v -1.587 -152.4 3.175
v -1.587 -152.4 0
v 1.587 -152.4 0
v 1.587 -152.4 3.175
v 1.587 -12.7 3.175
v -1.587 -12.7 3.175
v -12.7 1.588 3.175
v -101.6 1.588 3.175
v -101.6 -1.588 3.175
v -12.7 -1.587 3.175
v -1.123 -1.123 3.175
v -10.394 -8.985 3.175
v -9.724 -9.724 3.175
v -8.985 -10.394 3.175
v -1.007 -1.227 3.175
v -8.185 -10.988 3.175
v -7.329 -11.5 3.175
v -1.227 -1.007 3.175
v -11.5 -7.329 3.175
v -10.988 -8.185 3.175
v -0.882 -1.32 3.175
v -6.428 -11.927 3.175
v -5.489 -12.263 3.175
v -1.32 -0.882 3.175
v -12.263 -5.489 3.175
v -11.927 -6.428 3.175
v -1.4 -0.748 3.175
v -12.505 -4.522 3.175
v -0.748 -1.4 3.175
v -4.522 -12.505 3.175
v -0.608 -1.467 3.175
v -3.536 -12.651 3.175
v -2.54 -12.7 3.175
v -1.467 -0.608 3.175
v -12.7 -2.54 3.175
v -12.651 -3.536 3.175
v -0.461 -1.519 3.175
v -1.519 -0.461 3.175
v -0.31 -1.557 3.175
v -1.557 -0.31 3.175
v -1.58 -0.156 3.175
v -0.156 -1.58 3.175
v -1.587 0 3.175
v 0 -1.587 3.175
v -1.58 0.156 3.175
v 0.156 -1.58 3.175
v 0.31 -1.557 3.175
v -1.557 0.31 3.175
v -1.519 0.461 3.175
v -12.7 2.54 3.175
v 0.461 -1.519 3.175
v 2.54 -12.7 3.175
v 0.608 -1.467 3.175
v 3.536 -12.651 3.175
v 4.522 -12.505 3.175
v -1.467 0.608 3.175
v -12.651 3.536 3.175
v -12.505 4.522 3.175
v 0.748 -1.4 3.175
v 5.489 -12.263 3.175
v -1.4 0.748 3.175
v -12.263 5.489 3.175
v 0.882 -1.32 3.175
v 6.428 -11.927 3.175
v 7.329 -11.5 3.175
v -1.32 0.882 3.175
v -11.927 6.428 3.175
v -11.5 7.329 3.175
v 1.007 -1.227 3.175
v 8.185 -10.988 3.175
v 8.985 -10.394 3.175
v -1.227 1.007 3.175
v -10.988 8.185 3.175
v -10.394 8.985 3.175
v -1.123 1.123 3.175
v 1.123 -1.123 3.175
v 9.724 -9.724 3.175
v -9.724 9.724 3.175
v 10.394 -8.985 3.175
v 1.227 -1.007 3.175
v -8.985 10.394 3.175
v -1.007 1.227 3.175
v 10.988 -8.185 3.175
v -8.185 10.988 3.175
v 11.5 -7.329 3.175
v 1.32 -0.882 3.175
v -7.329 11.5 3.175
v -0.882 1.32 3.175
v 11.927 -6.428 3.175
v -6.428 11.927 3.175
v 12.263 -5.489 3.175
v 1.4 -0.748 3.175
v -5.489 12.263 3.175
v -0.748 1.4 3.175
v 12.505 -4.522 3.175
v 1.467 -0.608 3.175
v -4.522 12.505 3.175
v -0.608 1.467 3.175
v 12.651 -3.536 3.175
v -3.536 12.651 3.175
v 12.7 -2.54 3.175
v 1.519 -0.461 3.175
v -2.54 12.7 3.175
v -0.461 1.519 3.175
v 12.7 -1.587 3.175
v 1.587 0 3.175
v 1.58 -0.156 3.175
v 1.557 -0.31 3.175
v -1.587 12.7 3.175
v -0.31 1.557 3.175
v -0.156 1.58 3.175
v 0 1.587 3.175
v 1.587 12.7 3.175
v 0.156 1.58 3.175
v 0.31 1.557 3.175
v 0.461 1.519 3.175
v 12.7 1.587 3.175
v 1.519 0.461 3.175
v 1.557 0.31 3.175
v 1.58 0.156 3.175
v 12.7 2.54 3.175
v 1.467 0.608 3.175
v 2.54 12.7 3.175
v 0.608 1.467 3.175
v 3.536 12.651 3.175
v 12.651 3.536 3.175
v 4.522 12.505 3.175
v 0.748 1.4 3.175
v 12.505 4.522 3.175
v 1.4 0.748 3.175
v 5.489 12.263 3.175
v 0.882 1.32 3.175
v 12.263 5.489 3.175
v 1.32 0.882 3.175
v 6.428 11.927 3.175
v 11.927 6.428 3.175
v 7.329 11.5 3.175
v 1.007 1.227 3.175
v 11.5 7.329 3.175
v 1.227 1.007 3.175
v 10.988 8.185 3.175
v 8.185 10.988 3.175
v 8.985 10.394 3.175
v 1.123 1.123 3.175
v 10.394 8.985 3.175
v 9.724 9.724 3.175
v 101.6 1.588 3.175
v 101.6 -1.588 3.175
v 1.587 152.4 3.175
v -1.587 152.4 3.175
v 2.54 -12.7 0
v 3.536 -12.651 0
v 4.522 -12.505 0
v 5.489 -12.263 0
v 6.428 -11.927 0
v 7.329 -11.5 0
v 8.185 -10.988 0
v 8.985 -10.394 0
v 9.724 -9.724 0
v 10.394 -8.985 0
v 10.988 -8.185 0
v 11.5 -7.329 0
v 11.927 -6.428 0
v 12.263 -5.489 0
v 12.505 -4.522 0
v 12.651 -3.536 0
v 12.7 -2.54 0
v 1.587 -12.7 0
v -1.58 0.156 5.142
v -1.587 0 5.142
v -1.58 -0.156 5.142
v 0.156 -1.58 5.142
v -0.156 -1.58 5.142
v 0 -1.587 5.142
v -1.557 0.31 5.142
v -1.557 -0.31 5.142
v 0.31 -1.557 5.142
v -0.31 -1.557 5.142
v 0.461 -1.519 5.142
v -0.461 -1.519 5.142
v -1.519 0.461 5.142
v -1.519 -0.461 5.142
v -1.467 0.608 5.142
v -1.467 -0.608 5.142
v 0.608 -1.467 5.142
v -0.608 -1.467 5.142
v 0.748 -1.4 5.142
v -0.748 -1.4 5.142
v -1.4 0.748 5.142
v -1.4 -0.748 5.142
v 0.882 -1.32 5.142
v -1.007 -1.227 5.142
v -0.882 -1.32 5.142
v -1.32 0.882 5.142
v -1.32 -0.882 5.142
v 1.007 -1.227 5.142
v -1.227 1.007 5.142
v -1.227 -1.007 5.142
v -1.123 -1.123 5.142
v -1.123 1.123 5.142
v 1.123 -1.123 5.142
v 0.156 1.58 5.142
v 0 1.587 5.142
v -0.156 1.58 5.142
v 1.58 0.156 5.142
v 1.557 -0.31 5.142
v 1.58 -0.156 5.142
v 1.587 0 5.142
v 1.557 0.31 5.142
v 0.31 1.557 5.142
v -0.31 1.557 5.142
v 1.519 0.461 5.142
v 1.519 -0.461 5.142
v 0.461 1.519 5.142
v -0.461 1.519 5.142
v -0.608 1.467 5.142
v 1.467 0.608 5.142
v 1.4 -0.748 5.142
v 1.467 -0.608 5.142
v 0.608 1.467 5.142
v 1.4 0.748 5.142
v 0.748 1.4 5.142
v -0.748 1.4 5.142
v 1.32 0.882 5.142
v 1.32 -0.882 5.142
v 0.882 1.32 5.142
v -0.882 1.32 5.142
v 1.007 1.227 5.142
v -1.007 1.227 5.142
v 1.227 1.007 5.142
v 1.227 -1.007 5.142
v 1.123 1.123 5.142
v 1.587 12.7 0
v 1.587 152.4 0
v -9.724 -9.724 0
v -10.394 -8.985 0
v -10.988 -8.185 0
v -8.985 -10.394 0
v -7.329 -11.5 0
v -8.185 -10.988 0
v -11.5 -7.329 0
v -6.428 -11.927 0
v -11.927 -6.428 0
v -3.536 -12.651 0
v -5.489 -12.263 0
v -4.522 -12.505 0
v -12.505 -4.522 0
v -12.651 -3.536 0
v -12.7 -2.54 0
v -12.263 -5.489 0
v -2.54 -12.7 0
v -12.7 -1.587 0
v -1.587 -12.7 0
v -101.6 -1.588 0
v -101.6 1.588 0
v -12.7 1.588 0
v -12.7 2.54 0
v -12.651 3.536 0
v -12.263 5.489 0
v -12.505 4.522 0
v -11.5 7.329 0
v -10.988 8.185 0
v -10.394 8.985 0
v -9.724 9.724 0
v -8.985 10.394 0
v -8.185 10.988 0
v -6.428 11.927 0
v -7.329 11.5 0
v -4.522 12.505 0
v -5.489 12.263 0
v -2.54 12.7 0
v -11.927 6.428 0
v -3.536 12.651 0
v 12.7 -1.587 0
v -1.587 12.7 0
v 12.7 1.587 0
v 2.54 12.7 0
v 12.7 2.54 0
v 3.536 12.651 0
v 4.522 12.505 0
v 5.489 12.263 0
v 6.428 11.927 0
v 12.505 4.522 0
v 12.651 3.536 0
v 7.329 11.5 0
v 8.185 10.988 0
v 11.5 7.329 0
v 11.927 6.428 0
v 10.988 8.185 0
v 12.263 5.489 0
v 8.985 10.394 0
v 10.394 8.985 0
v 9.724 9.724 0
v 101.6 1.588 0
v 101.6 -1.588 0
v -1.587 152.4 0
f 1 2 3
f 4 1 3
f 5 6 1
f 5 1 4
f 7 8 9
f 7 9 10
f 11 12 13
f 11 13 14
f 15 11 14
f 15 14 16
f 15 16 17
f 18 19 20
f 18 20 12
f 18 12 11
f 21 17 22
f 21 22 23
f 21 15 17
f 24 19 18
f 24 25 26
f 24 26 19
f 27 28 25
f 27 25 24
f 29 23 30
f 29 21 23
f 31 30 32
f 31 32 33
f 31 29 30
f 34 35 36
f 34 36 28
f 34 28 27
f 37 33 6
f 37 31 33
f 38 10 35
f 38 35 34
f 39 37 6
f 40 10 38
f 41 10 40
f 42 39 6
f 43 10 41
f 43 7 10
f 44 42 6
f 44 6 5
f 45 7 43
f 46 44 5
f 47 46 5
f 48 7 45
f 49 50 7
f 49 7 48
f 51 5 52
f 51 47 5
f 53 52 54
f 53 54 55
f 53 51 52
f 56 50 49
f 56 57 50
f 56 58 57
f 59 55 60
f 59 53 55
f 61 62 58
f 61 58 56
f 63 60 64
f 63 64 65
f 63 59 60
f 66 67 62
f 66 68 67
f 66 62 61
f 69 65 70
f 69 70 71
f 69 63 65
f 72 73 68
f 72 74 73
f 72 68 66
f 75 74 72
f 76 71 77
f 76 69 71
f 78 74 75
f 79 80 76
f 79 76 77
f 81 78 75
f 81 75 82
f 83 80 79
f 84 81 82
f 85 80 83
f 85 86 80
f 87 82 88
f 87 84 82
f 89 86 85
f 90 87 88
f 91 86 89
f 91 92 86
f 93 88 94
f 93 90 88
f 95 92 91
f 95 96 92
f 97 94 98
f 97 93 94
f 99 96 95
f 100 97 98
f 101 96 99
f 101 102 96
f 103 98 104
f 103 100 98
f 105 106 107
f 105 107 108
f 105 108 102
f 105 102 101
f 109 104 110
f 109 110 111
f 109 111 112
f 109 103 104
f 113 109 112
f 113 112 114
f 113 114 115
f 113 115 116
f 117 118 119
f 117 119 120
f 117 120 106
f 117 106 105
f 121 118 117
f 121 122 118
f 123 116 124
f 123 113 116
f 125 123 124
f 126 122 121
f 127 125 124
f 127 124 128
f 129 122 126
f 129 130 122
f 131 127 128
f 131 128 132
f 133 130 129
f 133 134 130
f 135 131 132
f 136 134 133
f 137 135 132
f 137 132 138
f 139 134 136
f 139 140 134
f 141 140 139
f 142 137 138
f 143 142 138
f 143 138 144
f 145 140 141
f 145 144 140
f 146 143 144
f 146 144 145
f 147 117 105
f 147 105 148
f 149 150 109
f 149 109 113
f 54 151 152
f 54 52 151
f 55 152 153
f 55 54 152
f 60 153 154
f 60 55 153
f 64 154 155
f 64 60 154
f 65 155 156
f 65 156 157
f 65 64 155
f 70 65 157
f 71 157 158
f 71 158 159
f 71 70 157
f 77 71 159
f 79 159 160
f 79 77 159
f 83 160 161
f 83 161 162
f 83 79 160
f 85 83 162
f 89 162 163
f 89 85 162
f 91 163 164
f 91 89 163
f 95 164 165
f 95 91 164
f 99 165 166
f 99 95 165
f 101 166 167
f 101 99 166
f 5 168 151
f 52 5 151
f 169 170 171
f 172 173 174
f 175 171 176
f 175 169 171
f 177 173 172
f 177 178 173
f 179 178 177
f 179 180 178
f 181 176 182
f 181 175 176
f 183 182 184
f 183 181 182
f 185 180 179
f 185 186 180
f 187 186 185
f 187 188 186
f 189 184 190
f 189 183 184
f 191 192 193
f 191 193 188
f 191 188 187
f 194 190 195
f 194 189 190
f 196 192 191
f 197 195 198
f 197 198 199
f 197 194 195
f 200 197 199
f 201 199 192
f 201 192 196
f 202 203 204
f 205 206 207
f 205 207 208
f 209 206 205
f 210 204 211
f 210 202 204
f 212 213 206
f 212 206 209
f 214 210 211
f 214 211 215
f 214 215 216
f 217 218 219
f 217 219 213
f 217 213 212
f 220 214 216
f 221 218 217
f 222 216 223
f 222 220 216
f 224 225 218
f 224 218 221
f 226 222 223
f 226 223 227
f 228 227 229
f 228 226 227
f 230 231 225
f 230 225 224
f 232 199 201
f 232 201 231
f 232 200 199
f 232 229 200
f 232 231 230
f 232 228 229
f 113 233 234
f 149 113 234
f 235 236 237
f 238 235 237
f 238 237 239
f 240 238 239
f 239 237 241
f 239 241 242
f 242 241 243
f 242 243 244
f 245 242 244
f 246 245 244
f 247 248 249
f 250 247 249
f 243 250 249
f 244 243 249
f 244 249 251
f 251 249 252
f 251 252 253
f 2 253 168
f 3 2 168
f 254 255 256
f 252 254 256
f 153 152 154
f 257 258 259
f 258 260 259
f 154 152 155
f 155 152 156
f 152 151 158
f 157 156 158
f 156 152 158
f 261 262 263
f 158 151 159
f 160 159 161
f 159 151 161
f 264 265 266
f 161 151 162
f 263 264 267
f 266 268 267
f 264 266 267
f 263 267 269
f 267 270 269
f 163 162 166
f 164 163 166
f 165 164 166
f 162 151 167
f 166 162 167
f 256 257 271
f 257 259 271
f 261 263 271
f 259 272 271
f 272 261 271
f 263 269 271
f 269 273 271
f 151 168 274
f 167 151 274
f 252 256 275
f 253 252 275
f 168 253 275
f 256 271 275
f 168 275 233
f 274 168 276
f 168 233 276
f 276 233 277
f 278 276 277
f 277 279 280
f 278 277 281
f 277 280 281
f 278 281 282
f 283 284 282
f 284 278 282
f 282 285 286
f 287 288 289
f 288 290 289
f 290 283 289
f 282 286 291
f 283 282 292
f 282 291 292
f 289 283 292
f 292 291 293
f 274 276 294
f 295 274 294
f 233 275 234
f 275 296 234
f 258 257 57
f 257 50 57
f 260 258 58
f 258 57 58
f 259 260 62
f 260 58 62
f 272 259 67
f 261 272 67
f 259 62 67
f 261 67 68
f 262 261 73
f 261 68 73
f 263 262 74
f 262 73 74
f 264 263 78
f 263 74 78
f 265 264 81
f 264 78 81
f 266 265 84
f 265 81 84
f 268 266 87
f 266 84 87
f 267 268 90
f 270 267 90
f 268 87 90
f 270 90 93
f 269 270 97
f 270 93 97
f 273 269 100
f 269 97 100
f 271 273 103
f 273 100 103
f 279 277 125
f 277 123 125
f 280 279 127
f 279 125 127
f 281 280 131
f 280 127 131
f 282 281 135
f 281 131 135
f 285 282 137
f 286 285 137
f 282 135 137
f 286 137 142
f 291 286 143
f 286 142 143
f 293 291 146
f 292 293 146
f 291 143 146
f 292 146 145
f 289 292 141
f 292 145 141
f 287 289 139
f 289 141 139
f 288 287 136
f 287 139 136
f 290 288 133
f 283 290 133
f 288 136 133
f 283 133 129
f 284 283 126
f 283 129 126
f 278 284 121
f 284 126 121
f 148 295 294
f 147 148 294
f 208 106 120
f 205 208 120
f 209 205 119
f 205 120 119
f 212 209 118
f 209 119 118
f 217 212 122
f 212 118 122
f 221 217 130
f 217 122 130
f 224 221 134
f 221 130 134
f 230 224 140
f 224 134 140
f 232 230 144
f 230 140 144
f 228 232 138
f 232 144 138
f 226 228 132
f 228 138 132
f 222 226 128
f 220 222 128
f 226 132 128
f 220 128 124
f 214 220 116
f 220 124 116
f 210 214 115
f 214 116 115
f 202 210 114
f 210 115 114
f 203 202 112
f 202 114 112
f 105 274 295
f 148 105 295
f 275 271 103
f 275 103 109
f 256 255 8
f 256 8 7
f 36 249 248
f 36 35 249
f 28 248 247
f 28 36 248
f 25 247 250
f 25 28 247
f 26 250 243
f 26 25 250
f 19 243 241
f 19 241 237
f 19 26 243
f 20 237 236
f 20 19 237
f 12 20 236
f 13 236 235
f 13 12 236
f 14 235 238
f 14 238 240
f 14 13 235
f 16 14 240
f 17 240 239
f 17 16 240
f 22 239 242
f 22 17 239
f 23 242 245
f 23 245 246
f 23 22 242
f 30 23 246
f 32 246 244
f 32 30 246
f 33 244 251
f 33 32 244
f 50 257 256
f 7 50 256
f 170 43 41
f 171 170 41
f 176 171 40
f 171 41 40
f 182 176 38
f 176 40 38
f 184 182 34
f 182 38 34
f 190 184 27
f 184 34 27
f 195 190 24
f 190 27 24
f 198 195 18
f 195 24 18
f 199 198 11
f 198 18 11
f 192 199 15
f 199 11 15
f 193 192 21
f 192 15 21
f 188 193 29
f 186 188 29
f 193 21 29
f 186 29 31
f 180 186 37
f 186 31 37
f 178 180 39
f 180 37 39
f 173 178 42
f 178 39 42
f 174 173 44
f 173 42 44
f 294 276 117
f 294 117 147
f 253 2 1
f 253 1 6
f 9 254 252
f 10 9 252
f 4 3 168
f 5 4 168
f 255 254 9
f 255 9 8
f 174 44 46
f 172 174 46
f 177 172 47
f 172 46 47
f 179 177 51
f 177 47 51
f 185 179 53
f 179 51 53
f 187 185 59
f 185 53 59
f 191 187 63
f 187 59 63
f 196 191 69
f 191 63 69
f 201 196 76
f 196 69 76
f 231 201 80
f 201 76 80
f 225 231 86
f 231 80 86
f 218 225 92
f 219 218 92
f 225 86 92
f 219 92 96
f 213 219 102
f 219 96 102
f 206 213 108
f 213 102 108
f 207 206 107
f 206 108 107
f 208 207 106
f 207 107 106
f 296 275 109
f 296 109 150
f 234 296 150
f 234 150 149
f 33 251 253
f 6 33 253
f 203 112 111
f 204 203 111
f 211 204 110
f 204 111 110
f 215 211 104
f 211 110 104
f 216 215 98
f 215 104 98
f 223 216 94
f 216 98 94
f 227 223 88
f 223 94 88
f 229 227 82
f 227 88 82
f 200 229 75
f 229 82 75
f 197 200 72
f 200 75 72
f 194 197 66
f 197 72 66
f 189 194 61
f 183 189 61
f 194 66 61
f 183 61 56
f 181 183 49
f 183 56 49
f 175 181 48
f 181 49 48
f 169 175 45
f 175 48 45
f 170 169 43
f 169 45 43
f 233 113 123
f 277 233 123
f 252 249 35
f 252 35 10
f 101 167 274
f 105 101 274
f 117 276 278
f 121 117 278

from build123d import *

# Parameters (mm, degrees)
F0_W     = 11.1125013079
F0_H     = 11.1125
F0_W_2   = 3.1749973842
F0_H_2   = 139.7
F0_W_3   = 88.9
F0_H_3   = 3.175
F1_DEPTH = 3.175
F2_DEPTH = 5.1418882795
F3_R     = 10.16


# Not quite as in the source:
# - ends of sketch curves that miss each other by under 0.0002 mm in the source are joined


with BuildPart() as f1:
    # F0 (on Top) → F1 (new body)
    with BuildSketch(Plane.XY):
        with Locations((-7.143749346, 7.14375)):
            Rectangle(F0_W, F0_H)
        with Locations((7.143749346, 7.14375)):
            Rectangle(F0_W, F0_H)
        with Locations((7.143749346, -7.14375)):
            Rectangle(F0_W, F0_H)
        with Locations((-7.143749346, -7.14375)):
            Rectangle(F0_W, F0_H)
        with Locations((0, 82.55)):
            Rectangle(F0_W_2, F0_H_2)
        Polygon((0, 1.5875), (1.5874986921, 1.5875), (1.5874986921, 12.7), (-1.5874986921, 12.7), (-1.5874986921, 1.5875), align=None)
        Polygon((1.5874986921, -1.5875), (12.7, -1.5875), (12.7, 1.5875), (1.5874986921, 1.5875), (1.5874986921, 0), align=None)
        Polygon((-12.7, -1.5875), (-1.5874986921, -1.5875), (-1.5874986921, 0), (-1.5874986921, 1.5875), (-12.7, 1.5875), align=None)
        Polygon((1.5874986921, -12.7), (1.5874986921, -1.5875), (0, -1.5875), (-1.5874986921, -1.5875), (-1.5874986921, -12.7), align=None)
        with Locations((0, -82.55)):
            Rectangle(F0_W_2, F0_H_2)
        with Locations((-57.15, 0)):
            Rectangle(F0_W_3, F0_H_3)
        with Locations((57.15, 0)):
            Rectangle(F0_W_3, F0_H_3)
        with BuildLine():
            Line((-1.5874986921, 1.5875), (-1.5874986921, 0))
            ThreePointArc((-1.5874986921, 0), (-1.1225320151, 1.1225320151), (0, 1.5875))
            Line((0, 1.5875), (-1.5874986921, 1.5875))
        make_face()
        with BuildLine():
            ThreePointArc((-1.5875, 0), (-1.1225320151, -1.1225320151), (0, -1.5875))
            ThreePointArc((0, -1.5875), (1.1225320151, -1.1225320151), (1.5875, 0))
            ThreePointArc((1.5875, 0), (1.1225320151, 1.1225320151), (0, 1.5875))
            ThreePointArc((0, 1.5875), (-1.1225320151, 1.1225320151), (-1.5875, 0))
        make_face()
        with BuildLine():
            ThreePointArc((0, 1.5875), (1.1225320151, 1.1225320151), (1.5875, 0))
            Line((1.5875, 0), (1.5874986921, 1.5875))
            Line((1.5874986921, 1.5875), (0, 1.5875))
        make_face()
        with BuildLine():
            Line((-1.5874986921, -1.5875), (0, -1.5875))
            ThreePointArc((0, -1.5875), (-1.1225320151, -1.1225320151), (-1.5875, 0))
            Line((-1.5875, 0), (-1.5874986921, -1.5875))
        make_face()
        with BuildLine():
            Line((0, -1.5875), (1.5874986921, -1.5875))
            Line((1.5874986921, -1.5875), (1.5874986921, 0))
            ThreePointArc((1.5874986921, 0), (1.1225320151, -1.1225320151), (0, -1.5875))
        make_face()
    extrude(amount=F1_DEPTH)

    # F0 (on Top) → F2 (join)
    with BuildSketch(Plane.XY):
        with BuildLine():
            ThreePointArc((-1.5875, 0), (-1.1225320151, -1.1225320151), (0, -1.5875))
            ThreePointArc((0, -1.5875), (1.1225320151, -1.1225320151), (1.5875, 0))
            ThreePointArc((1.5875, 0), (1.1225320151, 1.1225320151), (0, 1.5875))
            ThreePointArc((0, 1.5875), (-1.1225320151, 1.1225320151), (-1.5875, 0))
        make_face()
    extrude(amount=F2_DEPTH)

    # F3
    f3_edges = [f1.edges().sort_by_distance(p)[0] for p in [
        (12.7, -12.7, 1.5875),
        (-12.7, -12.7, 1.5875),
        (12.7, 12.7, 1.5875),
        (-12.7, 12.7, 1.5875),
    ]]
    fillet(f3_edges, radius=F3_R)


solid = f1.part
